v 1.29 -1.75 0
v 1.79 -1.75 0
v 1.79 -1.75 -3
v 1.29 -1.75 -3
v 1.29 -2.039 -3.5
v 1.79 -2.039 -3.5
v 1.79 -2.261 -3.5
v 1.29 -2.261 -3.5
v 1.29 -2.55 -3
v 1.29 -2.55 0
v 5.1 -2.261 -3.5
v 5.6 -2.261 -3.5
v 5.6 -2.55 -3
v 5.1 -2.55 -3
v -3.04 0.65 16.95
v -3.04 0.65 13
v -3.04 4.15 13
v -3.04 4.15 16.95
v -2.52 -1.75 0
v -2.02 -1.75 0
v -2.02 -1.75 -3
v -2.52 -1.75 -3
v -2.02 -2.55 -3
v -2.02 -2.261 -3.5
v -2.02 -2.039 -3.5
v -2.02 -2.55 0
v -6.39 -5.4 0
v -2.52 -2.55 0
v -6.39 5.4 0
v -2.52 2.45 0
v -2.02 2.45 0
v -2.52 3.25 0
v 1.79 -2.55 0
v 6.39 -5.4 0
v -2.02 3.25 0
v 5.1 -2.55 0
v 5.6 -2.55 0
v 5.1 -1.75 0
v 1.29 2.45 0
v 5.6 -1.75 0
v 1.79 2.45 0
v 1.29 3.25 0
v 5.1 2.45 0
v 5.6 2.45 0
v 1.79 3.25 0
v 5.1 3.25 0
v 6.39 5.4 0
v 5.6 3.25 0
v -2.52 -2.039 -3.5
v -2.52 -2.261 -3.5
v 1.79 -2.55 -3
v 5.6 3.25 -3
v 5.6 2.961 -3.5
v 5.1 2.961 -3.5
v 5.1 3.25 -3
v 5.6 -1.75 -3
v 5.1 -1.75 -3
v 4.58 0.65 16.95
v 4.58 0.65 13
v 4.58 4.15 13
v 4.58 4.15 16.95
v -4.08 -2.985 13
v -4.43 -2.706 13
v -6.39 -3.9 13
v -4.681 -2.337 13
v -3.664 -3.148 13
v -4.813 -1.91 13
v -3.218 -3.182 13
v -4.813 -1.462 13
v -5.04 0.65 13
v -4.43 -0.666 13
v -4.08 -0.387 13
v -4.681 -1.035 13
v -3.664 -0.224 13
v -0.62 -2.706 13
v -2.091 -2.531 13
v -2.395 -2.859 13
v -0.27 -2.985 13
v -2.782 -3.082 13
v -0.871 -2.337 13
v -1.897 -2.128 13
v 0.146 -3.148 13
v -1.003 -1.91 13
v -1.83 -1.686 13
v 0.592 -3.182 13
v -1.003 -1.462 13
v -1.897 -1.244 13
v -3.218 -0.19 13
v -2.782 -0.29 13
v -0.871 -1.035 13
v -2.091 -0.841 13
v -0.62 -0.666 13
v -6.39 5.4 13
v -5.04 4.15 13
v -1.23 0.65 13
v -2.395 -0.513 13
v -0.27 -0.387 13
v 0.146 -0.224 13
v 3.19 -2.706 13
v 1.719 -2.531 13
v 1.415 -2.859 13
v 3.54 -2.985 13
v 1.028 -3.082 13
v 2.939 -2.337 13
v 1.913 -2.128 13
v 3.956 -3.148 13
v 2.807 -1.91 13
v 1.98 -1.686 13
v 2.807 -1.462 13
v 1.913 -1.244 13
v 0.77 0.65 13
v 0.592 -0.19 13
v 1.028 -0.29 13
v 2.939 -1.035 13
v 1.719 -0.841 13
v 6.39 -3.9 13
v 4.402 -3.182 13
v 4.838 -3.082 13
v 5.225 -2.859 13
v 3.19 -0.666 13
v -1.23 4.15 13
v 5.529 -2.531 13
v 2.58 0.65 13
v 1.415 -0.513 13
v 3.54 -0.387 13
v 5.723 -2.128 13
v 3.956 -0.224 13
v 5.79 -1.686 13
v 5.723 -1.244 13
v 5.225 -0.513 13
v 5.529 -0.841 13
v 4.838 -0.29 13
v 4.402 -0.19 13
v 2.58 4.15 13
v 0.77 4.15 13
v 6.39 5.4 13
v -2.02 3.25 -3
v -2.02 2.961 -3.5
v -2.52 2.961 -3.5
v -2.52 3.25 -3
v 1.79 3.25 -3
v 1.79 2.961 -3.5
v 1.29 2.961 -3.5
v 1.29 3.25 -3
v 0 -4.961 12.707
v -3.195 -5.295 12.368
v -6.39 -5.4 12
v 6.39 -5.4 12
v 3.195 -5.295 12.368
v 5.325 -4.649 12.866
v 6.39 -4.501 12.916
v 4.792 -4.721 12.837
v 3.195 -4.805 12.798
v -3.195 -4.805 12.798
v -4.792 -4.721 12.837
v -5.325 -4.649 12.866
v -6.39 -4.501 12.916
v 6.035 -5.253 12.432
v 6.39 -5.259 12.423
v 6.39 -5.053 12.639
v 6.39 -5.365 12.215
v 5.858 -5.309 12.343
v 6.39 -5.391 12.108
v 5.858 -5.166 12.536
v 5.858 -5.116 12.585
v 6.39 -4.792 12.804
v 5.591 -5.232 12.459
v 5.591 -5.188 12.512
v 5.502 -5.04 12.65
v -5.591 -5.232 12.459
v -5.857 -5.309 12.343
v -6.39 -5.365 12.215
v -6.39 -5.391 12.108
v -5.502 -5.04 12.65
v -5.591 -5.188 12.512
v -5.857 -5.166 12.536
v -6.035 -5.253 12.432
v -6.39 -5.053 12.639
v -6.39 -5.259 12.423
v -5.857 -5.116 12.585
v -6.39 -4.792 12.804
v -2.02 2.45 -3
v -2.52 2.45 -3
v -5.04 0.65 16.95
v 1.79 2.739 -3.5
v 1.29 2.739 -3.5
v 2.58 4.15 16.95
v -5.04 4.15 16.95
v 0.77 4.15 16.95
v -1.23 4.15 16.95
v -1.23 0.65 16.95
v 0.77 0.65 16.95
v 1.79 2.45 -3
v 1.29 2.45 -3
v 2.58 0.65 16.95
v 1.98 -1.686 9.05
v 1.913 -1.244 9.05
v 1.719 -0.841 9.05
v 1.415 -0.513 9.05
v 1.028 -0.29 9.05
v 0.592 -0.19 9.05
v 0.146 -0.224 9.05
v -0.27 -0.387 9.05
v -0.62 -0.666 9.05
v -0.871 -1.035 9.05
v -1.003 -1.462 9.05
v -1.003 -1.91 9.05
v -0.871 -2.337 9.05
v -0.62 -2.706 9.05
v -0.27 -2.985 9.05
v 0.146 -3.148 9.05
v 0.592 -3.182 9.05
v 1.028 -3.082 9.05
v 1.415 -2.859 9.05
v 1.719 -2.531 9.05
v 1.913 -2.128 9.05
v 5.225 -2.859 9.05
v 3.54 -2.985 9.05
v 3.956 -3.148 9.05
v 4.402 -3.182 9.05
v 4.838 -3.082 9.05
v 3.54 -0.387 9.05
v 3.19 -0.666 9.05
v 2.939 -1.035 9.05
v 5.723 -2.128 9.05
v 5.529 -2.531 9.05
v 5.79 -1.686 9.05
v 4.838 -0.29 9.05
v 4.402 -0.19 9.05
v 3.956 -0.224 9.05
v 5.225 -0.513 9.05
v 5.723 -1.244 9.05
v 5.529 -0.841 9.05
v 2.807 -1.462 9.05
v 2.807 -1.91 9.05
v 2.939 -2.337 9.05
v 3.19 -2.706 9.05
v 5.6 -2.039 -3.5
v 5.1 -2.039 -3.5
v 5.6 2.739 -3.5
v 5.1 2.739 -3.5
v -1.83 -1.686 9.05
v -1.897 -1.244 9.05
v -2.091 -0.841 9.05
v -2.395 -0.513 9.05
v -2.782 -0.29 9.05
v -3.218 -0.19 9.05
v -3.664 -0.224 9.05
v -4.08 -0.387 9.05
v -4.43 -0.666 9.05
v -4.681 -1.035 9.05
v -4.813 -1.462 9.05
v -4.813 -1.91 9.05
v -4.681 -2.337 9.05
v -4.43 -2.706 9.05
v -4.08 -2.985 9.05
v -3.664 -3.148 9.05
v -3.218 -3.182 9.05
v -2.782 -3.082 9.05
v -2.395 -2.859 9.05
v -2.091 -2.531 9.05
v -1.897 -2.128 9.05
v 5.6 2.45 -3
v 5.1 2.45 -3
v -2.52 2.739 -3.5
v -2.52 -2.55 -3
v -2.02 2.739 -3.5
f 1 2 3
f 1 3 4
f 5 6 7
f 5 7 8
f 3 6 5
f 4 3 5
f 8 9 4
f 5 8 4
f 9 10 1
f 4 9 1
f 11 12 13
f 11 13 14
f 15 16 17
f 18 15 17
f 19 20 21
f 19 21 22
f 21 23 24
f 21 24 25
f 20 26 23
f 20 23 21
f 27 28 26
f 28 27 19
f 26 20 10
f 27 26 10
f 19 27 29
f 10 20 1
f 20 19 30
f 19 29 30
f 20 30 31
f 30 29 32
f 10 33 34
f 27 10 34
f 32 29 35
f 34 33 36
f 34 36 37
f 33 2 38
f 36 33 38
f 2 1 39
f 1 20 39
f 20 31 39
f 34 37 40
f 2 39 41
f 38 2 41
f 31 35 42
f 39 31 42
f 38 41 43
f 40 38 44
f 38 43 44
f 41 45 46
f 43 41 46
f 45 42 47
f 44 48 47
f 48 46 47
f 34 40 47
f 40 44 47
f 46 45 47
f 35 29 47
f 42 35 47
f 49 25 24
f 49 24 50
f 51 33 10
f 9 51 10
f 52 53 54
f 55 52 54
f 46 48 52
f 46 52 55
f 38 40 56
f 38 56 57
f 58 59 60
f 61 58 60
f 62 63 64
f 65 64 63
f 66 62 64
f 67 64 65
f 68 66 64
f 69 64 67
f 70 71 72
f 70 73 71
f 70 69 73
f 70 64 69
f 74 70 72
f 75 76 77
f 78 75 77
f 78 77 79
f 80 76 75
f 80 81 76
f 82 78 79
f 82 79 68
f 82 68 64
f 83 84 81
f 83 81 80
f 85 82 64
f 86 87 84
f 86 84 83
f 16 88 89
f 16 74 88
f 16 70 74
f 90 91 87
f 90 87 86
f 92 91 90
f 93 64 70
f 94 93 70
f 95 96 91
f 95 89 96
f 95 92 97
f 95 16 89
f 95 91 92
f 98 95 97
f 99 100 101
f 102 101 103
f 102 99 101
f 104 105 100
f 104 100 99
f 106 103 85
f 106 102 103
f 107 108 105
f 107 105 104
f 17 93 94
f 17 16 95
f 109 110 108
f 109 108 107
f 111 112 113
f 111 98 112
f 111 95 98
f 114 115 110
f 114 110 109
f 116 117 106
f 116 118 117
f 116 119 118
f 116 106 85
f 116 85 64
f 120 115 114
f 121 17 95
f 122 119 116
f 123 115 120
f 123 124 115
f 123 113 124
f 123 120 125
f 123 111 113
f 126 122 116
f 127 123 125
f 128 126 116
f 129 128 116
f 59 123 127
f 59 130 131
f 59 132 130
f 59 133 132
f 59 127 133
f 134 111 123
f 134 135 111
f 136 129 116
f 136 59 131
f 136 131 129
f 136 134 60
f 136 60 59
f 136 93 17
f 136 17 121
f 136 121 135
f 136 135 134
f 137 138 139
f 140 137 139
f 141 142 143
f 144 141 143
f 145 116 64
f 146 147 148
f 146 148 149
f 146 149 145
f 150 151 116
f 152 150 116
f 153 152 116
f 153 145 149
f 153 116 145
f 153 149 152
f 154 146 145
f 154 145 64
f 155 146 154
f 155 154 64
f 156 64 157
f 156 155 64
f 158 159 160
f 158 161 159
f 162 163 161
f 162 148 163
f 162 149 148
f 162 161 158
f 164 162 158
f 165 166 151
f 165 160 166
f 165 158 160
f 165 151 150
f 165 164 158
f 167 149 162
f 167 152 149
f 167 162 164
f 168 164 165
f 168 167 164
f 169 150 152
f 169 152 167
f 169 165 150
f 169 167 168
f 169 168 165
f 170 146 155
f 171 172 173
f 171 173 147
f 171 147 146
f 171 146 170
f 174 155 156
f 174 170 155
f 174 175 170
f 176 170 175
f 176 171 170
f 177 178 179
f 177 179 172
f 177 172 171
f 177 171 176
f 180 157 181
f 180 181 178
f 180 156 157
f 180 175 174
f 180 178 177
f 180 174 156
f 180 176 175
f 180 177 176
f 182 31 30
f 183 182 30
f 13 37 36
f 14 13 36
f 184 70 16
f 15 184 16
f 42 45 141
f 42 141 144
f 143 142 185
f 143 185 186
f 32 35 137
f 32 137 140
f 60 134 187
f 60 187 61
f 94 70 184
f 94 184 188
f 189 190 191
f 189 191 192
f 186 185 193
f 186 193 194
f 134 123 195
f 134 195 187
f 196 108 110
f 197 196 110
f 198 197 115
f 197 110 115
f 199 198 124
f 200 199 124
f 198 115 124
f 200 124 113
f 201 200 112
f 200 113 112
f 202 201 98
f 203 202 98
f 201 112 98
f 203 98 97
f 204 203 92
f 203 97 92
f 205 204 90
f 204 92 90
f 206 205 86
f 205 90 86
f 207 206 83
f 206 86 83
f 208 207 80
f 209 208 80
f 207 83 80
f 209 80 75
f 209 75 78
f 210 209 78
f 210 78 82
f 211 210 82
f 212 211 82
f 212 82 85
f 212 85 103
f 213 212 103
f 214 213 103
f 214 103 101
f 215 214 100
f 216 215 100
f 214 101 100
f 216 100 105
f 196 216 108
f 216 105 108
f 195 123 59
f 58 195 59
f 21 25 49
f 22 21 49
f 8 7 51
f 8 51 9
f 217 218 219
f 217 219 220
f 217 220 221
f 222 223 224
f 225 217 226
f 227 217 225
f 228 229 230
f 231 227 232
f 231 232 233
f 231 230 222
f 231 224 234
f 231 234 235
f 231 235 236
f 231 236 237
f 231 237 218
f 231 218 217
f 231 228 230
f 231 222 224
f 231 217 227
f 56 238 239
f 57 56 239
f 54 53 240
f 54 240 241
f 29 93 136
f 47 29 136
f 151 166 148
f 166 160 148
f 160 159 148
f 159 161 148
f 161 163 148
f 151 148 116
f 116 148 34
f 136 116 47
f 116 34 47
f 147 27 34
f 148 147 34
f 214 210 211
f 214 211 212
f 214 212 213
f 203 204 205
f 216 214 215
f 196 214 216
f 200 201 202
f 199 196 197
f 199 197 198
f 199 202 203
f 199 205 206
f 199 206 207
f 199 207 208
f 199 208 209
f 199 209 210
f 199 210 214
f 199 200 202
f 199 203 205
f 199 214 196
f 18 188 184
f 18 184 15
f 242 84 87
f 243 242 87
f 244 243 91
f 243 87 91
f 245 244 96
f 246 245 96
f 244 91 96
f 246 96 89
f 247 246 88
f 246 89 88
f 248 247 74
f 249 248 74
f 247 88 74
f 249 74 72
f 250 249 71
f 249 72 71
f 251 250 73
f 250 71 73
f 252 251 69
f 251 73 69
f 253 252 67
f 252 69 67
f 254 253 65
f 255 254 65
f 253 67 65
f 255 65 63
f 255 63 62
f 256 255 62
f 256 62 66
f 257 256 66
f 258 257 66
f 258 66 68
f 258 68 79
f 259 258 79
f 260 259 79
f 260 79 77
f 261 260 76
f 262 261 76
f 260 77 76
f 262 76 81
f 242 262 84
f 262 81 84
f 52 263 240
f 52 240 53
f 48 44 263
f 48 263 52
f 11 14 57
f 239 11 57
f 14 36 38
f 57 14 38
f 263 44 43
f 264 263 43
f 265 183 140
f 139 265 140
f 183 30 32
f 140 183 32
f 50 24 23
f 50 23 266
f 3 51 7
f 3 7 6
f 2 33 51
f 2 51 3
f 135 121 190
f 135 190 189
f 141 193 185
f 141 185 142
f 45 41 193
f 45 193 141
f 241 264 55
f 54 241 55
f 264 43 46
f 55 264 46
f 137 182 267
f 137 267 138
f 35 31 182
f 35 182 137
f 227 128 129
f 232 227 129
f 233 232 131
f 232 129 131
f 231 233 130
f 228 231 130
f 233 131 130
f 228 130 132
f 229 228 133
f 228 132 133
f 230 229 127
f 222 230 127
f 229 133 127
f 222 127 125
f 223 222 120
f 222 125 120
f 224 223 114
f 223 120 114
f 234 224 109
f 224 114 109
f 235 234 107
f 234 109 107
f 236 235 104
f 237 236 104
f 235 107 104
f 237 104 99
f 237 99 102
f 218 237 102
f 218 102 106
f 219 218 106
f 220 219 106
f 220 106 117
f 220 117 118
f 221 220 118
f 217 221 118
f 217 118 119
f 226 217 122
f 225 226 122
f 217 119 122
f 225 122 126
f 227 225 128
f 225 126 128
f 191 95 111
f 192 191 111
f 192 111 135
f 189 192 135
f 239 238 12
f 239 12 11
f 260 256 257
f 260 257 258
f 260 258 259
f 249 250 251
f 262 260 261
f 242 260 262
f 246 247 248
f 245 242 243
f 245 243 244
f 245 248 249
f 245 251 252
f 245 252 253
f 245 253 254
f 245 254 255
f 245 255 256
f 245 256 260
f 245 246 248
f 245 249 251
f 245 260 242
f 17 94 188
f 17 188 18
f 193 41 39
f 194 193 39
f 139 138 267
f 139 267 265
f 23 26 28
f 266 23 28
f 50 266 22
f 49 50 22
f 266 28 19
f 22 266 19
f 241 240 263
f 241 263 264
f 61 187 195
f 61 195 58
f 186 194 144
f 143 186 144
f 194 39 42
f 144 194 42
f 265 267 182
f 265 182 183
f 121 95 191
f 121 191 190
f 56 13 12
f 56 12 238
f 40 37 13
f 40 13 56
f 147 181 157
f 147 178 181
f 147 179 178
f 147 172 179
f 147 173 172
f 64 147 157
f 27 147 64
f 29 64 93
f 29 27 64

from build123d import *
from OCP.BRepFilletAPI import BRepFilletAPI_MakeChamfer

# Parameters (mm, degrees)
SKETCH_1_W                          = 12.78
SKETCH_1_H                          = 10.8
EXTRUDE_1_DEPTH                     = 13
FILLET_1_SIZE                       = 1
FILLET_1_SIZE_2                     = 1.5
SKETCH_2_W                          = 2
SKETCH_2_H                          = 3.5
EXTRUDE_2_DEPTH                     = 3.95
SKETCH_3_R                          = 1.5
CUT_EXTRUDE_1_DEPTH                 = 3.95
SKETCH_4_W                          = 0.5
SKETCH_4_H                          = 0.8
EXTRUDE_3_DEPTH                     = 3.5
CHAMFER_1_SIZE                      = 0.5
CHAMFER_1_SIZE2                     = 0.288675135
PATTERN_LINEAR_2_COUNT              = 3
PATTERN_LINEAR_2_PITCH              = 3.81
CHAMFER_1_OF_PATTERN_LINEAR_2_SIZE  = 0.5
CHAMFER_1_OF_PATTERN_LINEAR_2_SIZE2 = 0.288675135


with BuildPart() as part:
    # Эскиз1 → Бобышка-Вытянуть1 (new body)
    with BuildSketch(Plane.XY):
        Rectangle(SKETCH_1_W, SKETCH_1_H)
    extrude(amount=EXTRUDE_1_DEPTH)

    # Скругление1
    # an asymmetric fillet: 1.5, 1 mm, written as the material it takes off along each edge
    with BuildSketch(Plane(origin=(-10.14, -5.4, 13), x_dir=(0, 0, -1), z_dir=(1, 0, 0))) as fillet_1_piece_1:
        with BuildLine():
            Bezier((FILLET_1_SIZE, 0), (0, 0), (0, FILLET_1_SIZE_2), weights=[1, 0.707106781, 1])
            Line((0, FILLET_1_SIZE_2), (0, 0))
            Line((0, 0), (FILLET_1_SIZE, 0))
        make_face()
    extrude(amount=20.28, mode=Mode.SUBTRACT)

    # Эскиз2 → Бобышка-Вытянуть2 (add)
    with BuildSketch(Plane.XY.offset(13)):
        with Locations((3.58, 2.4)):
            Rectangle(SKETCH_2_W, SKETCH_2_H)
    extrude_2 = extrude(amount=EXTRUDE_2_DEPTH)

    # Эскиз3 → Вырез-Вытянуть1 (cut)
    with BuildSketch(Plane.XY.offset(13)):
        with Locations((4.29, -1.686021073)):
            Circle(SKETCH_3_R)
    cut_extrude_1 = extrude(amount=-CUT_EXTRUDE_1_DEPTH, mode=Mode.SUBTRACT)

    # Эскиз4 → Бобышка-Вытянуть3 (add)
    with BuildSketch(Plane(origin=(0, 0, 0), x_dir=(-1, 0, 0), z_dir=(0, 0, -1))):
        with Locations((-5.35, 2.85)):
            Rectangle(SKETCH_4_W, SKETCH_4_H)
        with Locations((-5.35, -2.15)):
            Rectangle(SKETCH_4_W, SKETCH_4_H)
    extrude_3 = extrude(amount=EXTRUDE_3_DEPTH)

    # Фаска1: one chamfer whose edges measure the first distance from different faces: ONE call of the kernel's chamfer builder (chamfer() names one face for all edges)
    chamfer_1_edges_1 = [part.edges().sort_by_distance(p)[0] for p in [
        (5.35, 3.25, -3.5),
    ]]
    chamfer_1_side_1 = [part.faces().sort_by_distance(p)[0] for p in [
        (5.35, 3.25, -1.75),
    ]]
    chamfer_1_edges_2 = [part.edges().sort_by_distance(p)[0] for p in [
        (5.35, 2.45, -3.5),
    ]]
    chamfer_1_side_2 = [part.faces().sort_by_distance(p)[0] for p in [
        (5.35, 2.45, -1.75),
    ]]
    chamfer_1_edges_3 = [part.edges().sort_by_distance(p)[0] for p in [
        (5.35, -2.55, -3.5),
    ]]
    chamfer_1_side_3 = [part.faces().sort_by_distance(p)[0] for p in [
        (5.35, -2.55, -1.75),
    ]]
    chamfer_1_edges_4 = [part.edges().sort_by_distance(p)[0] for p in [
        (5.35, -1.75, -3.5),
    ]]
    chamfer_1_side_4 = [part.faces().sort_by_distance(p)[0] for p in [
        (5.35, -1.75, -1.75),
    ]]
    chamfer_1 = BRepFilletAPI_MakeChamfer(part.part.solid().wrapped)
    for e in chamfer_1_edges_1:
        chamfer_1.Add(CHAMFER_1_SIZE, CHAMFER_1_SIZE2, e.wrapped, chamfer_1_side_1[0].wrapped)  # the first distance lies on this face
    for e in chamfer_1_edges_2:
        chamfer_1.Add(CHAMFER_1_SIZE, CHAMFER_1_SIZE2, e.wrapped, chamfer_1_side_2[0].wrapped)  # the first distance lies on this face
    for e in chamfer_1_edges_3:
        chamfer_1.Add(CHAMFER_1_SIZE, CHAMFER_1_SIZE2, e.wrapped, chamfer_1_side_3[0].wrapped)  # the first distance lies on this face
    for e in chamfer_1_edges_4:
        chamfer_1.Add(CHAMFER_1_SIZE, CHAMFER_1_SIZE2, e.wrapped, chamfer_1_side_4[0].wrapped)  # the first distance lies on this face
    add(Compound.cast(chamfer_1.Shape()), mode=Mode.REPLACE)

    # Линейный массив2: Бобышка-Вытянуть2, Вырез-Вытянуть1, Бобышка-Вытянуть3 ×3
    with Locations(*[(-i * PATTERN_LINEAR_2_PITCH, 0, 0) for i in range(1, PATTERN_LINEAR_2_COUNT)]):
        add(extrude_2)
        add(cut_extrude_1, mode=Mode.SUBTRACT)
        add(extrude_3)

    # Фаска1 of Линейный массив2: one chamfer whose edges measure the first distance from different faces: ONE call of the kernel's chamfer builder (chamfer() names one face for all edges)
    chamfer_1_of_pattern_linear_2_edges_1 = [part.edges().sort_by_distance(p)[0] for p in [
        (1.54, 3.25, -3.5),
    ]]
    chamfer_1_of_pattern_linear_2_side_1 = [part.faces().sort_by_distance(p)[0] for p in [
        (1.54, 3.25, -1.75),
    ]]
    chamfer_1_of_pattern_linear_2_edges_2 = [part.edges().sort_by_distance(p)[0] for p in [
        (1.54, 2.45, -3.5),
    ]]
    chamfer_1_of_pattern_linear_2_side_2 = [part.faces().sort_by_distance(p)[0] for p in [
        (1.54, 2.45, -1.75),
    ]]
    chamfer_1_of_pattern_linear_2_edges_3 = [part.edges().sort_by_distance(p)[0] for p in [
        (1.54, -2.55, -3.5),
    ]]
    chamfer_1_of_pattern_linear_2_side_3 = [part.faces().sort_by_distance(p)[0] for p in [
        (1.54, -2.55, -1.75),
    ]]
    chamfer_1_of_pattern_linear_2_edges_4 = [part.edges().sort_by_distance(p)[0] for p in [
        (1.54, -1.75, -3.5),
    ]]
    chamfer_1_of_pattern_linear_2_side_4 = [part.faces().sort_by_distance(p)[0] for p in [
        (1.54, -1.75, -1.75),
    ]]
    chamfer_1_of_pattern_linear_2_edges_5 = [part.edges().sort_by_distance(p)[0] for p in [
        (-2.27, 3.25, -3.5),
    ]]
    chamfer_1_of_pattern_linear_2_side_5 = [part.faces().sort_by_distance(p)[0] for p in [
        (-2.27, 3.25, -1.75),
    ]]
    chamfer_1_of_pattern_linear_2_edges_6 = [part.edges().sort_by_distance(p)[0] for p in [
        (-2.27, 2.45, -3.5),
    ]]
    chamfer_1_of_pattern_linear_2_side_6 = [part.faces().sort_by_distance(p)[0] for p in [
        (-2.27, 2.45, -1.75),
    ]]
    chamfer_1_of_pattern_linear_2_edges_7 = [part.edges().sort_by_distance(p)[0] for p in [
        (-2.27, -2.55, -3.5),
    ]]
    chamfer_1_of_pattern_linear_2_side_7 = [part.faces().sort_by_distance(p)[0] for p in [
        (-2.27, -2.55, -1.75),
    ]]
    chamfer_1_of_pattern_linear_2_edges_8 = [part.edges().sort_by_distance(p)[0] for p in [
        (-2.27, -1.75, -3.5),
    ]]
    chamfer_1_of_pattern_linear_2_side_8 = [part.faces().sort_by_distance(p)[0] for p in [
        (-2.27, -1.75, -1.75),
    ]]
    chamfer_1_of_pattern_linear_2 = BRepFilletAPI_MakeChamfer(part.part.solid().wrapped)
    for e in chamfer_1_of_pattern_linear_2_edges_1:
        chamfer_1_of_pattern_linear_2.Add(CHAMFER_1_OF_PATTERN_LINEAR_2_SIZE, CHAMFER_1_OF_PATTERN_LINEAR_2_SIZE2, e.wrapped, chamfer_1_of_pattern_linear_2_side_1[0].wrapped)  # the first distance lies on this face
    for e in chamfer_1_of_pattern_linear_2_edges_2:
        chamfer_1_of_pattern_linear_2.Add(CHAMFER_1_OF_PATTERN_LINEAR_2_SIZE, CHAMFER_1_OF_PATTERN_LINEAR_2_SIZE2, e.wrapped, chamfer_1_of_pattern_linear_2_side_2[0].wrapped)  # the first distance lies on this face
    for e in chamfer_1_of_pattern_linear_2_edges_3:
        chamfer_1_of_pattern_linear_2.Add(CHAMFER_1_OF_PATTERN_LINEAR_2_SIZE, CHAMFER_1_OF_PATTERN_LINEAR_2_SIZE2, e.wrapped, chamfer_1_of_pattern_linear_2_side_3[0].wrapped)  # the first distance lies on this face
    for e in chamfer_1_of_pattern_linear_2_edges_4:
        chamfer_1_of_pattern_linear_2.Add(CHAMFER_1_OF_PATTERN_LINEAR_2_SIZE, CHAMFER_1_OF_PATTERN_LINEAR_2_SIZE2, e.wrapped, chamfer_1_of_pattern_linear_2_side_4[0].wrapped)  # the first distance lies on this face
    for e in chamfer_1_of_pattern_linear_2_edges_5:
        chamfer_1_of_pattern_linear_2.Add(CHAMFER_1_OF_PATTERN_LINEAR_2_SIZE, CHAMFER_1_OF_PATTERN_LINEAR_2_SIZE2, e.wrapped, chamfer_1_of_pattern_linear_2_side_5[0].wrapped)  # the first distance lies on this face
    for e in chamfer_1_of_pattern_linear_2_edges_6:
        chamfer_1_of_pattern_linear_2.Add(CHAMFER_1_OF_PATTERN_LINEAR_2_SIZE, CHAMFER_1_OF_PATTERN_LINEAR_2_SIZE2, e.wrapped, chamfer_1_of_pattern_linear_2_side_6[0].wrapped)  # the first distance lies on this face
    for e in chamfer_1_of_pattern_linear_2_edges_7:
        chamfer_1_of_pattern_linear_2.Add(CHAMFER_1_OF_PATTERN_LINEAR_2_SIZE, CHAMFER_1_OF_PATTERN_LINEAR_2_SIZE2, e.wrapped, chamfer_1_of_pattern_linear_2_side_7[0].wrapped)  # the first distance lies on this face
    for e in chamfer_1_of_pattern_linear_2_edges_8:
        chamfer_1_of_pattern_linear_2.Add(CHAMFER_1_OF_PATTERN_LINEAR_2_SIZE, CHAMFER_1_OF_PATTERN_LINEAR_2_SIZE2, e.wrapped, chamfer_1_of_pattern_linear_2_side_8[0].wrapped)  # the first distance lies on this face
    add(Compound.cast(chamfer_1_of_pattern_linear_2.Shape()), mode=Mode.REPLACE)


solid = part.part
